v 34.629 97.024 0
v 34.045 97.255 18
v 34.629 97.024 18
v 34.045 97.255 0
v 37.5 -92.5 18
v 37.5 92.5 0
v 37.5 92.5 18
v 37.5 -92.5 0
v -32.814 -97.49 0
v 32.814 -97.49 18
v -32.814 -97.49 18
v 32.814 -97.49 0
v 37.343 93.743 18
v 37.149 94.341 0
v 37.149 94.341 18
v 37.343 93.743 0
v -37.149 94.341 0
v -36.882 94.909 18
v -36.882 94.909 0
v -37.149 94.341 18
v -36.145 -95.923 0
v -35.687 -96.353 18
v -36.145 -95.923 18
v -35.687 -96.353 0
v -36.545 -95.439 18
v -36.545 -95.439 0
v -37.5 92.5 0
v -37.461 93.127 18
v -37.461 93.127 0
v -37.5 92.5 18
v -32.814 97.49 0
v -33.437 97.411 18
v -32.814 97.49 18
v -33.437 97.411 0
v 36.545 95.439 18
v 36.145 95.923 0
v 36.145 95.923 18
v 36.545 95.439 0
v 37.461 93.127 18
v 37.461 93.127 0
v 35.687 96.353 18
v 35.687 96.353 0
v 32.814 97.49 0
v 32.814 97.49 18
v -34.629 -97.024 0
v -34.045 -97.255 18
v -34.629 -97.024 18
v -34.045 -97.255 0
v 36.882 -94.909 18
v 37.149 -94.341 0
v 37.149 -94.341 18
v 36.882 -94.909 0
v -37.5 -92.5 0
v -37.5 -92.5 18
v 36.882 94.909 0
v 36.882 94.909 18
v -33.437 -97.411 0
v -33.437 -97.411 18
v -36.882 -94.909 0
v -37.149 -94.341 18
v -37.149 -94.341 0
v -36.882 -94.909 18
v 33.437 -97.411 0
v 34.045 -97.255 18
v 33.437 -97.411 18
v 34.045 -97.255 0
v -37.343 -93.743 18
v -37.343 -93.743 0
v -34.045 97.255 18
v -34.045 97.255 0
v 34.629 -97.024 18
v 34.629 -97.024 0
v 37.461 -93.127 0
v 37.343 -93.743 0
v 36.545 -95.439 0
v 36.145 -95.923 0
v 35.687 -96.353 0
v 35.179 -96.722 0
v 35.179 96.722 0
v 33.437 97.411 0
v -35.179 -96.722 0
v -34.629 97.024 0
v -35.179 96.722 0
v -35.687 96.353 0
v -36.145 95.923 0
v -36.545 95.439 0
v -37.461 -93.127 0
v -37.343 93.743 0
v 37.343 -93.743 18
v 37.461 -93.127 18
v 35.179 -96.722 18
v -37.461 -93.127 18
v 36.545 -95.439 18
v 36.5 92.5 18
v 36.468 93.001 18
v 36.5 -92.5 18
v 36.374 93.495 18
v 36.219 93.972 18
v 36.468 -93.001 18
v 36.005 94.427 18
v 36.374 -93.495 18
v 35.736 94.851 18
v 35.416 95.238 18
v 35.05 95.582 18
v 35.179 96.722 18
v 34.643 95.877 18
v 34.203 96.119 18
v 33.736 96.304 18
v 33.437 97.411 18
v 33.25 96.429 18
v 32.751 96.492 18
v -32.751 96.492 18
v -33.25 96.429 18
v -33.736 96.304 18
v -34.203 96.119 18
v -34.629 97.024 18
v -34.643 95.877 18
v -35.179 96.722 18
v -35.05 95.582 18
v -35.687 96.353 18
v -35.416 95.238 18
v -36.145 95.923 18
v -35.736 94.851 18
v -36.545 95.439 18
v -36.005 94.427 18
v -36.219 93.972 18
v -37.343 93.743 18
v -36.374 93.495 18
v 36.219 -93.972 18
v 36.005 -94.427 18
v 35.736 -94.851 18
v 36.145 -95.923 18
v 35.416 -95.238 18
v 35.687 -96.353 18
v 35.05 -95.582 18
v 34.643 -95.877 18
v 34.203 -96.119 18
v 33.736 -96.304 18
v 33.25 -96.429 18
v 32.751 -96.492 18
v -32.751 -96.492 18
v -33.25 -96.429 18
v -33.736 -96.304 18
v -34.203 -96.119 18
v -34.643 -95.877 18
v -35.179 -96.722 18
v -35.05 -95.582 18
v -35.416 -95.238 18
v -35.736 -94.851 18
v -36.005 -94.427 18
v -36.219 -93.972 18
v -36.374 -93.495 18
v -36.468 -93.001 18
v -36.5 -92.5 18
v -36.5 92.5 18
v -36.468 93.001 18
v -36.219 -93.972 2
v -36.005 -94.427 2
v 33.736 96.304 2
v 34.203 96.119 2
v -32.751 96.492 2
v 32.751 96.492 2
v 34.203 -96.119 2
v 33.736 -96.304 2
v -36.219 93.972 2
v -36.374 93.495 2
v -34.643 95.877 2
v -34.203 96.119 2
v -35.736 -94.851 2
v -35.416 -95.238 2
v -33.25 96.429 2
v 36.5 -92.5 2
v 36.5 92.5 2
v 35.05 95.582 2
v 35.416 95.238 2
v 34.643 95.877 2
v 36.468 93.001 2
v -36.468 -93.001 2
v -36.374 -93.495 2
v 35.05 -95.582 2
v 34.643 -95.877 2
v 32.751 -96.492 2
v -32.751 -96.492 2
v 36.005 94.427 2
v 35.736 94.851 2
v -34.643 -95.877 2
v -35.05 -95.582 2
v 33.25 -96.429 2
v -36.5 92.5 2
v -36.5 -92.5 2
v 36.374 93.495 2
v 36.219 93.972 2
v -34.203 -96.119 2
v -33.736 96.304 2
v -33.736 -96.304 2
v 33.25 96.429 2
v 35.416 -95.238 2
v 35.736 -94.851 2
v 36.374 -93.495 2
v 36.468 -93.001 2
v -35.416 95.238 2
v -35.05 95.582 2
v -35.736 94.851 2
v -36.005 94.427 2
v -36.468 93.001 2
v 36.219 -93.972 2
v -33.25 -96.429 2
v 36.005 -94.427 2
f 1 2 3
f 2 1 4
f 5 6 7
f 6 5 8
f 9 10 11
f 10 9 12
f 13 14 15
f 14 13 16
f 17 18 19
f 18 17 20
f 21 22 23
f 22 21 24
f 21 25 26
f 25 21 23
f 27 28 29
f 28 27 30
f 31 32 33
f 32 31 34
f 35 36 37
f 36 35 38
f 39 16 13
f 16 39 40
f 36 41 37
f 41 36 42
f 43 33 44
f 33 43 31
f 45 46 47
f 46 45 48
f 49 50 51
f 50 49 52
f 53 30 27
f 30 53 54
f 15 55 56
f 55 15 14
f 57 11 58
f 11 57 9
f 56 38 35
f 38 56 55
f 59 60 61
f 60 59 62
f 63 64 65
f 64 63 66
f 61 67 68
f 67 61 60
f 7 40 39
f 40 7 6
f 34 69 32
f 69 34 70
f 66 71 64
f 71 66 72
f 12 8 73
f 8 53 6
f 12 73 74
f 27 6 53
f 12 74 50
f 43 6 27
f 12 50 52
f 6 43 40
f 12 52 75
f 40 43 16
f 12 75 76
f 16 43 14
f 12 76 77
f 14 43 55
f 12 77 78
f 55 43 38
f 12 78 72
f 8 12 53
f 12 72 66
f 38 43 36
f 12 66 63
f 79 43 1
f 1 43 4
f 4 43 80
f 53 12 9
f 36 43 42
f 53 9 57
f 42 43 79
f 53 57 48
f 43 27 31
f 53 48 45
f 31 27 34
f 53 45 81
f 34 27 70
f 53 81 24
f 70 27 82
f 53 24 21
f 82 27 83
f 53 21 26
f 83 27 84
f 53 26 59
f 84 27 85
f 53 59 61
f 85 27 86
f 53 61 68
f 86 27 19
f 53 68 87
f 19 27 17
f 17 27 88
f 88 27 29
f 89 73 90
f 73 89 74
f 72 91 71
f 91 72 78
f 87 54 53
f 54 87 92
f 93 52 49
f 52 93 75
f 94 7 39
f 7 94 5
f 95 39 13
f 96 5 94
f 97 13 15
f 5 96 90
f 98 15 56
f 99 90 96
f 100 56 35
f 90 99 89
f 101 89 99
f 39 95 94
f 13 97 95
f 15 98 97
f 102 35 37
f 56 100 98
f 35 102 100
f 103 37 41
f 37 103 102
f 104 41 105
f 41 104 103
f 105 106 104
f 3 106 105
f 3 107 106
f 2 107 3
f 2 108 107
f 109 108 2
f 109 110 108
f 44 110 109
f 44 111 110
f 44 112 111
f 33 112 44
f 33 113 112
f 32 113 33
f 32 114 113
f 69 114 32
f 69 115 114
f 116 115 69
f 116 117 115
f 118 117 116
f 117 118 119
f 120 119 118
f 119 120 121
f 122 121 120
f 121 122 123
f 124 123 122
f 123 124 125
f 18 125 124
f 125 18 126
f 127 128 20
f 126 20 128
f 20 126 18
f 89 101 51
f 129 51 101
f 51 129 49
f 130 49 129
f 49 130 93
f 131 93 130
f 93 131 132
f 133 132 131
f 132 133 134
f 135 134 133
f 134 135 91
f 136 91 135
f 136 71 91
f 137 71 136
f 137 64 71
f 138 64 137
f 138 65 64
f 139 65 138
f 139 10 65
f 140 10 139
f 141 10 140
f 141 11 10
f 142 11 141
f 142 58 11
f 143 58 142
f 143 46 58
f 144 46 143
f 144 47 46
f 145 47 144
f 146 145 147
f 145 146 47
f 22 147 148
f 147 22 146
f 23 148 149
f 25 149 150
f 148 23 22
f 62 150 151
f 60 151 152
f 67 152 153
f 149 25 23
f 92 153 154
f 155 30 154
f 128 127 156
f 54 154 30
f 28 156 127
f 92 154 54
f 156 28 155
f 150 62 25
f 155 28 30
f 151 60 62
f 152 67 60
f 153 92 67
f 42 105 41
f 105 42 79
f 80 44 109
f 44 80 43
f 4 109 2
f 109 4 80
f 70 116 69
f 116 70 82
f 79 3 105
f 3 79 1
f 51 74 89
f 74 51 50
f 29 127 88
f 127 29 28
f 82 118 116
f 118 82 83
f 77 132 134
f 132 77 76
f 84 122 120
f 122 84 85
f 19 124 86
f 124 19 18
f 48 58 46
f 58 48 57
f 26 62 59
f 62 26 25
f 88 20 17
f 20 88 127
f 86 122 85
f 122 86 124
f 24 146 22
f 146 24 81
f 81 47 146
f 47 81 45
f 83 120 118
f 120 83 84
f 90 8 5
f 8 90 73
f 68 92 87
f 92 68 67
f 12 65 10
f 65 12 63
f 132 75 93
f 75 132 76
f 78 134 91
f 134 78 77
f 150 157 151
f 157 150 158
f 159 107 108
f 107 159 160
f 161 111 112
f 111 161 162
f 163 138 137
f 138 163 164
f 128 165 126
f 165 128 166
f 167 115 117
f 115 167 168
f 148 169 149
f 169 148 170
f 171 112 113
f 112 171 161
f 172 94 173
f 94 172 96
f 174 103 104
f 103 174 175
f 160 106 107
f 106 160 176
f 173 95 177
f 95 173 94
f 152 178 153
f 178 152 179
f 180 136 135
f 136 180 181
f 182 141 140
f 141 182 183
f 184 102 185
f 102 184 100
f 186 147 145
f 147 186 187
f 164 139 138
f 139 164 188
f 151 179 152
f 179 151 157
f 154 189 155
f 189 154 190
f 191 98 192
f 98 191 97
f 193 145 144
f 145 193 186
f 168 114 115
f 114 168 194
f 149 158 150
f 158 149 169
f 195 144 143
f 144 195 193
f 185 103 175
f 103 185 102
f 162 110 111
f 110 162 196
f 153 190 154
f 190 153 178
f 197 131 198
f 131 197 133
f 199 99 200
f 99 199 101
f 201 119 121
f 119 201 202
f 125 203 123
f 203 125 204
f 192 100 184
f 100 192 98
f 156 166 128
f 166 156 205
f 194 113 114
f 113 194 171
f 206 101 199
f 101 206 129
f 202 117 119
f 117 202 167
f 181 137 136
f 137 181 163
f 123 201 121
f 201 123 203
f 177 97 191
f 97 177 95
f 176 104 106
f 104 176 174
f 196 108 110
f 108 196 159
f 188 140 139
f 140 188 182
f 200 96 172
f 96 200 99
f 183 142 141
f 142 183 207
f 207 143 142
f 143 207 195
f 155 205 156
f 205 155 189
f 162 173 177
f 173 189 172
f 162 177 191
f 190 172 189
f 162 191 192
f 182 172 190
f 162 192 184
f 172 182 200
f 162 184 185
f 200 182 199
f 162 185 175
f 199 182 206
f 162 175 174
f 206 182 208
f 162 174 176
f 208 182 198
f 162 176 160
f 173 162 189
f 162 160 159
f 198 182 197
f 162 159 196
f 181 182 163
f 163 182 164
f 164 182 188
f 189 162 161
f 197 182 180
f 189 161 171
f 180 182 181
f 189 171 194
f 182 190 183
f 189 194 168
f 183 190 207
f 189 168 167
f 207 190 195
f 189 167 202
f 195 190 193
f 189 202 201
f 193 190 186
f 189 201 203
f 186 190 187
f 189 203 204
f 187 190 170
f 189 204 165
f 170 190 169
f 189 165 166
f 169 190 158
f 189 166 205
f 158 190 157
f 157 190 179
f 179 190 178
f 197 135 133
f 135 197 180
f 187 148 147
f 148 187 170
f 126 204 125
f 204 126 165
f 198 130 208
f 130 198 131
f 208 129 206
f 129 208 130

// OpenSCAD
$fn = 50;


difference() {
	union() {
		hull() {
			translate(v = [-32.5000000000, 92.5000000000, 0]) {
				cylinder(h = 18, r = 5);
			}
			translate(v = [32.5000000000, 92.5000000000, 0]) {
				cylinder(h = 18, r = 5);
			}
			translate(v = [-32.5000000000, -92.5000000000, 0]) {
				cylinder(h = 18, r = 5);
			}
			translate(v = [32.5000000000, -92.5000000000, 0]) {
				cylinder(h = 18, r = 5);
			}
		}
	}
	union() {
		translate(v = [0, 0, 2]) {
			hull() {
				translate(v = [-32.5000000000, 92.5000000000, 0]) {
					cylinder(h = 16, r = 4);
				}
				translate(v = [32.5000000000, 92.5000000000, 0]) {
					cylinder(h = 16, r = 4);
				}
				translate(v = [-32.5000000000, -92.5000000000, 0]) {
					cylinder(h = 16, r = 4);
				}
				translate(v = [32.5000000000, -92.5000000000, 0]) {
					cylinder(h = 16, r = 4);
				}
			}
		}
	}
}
